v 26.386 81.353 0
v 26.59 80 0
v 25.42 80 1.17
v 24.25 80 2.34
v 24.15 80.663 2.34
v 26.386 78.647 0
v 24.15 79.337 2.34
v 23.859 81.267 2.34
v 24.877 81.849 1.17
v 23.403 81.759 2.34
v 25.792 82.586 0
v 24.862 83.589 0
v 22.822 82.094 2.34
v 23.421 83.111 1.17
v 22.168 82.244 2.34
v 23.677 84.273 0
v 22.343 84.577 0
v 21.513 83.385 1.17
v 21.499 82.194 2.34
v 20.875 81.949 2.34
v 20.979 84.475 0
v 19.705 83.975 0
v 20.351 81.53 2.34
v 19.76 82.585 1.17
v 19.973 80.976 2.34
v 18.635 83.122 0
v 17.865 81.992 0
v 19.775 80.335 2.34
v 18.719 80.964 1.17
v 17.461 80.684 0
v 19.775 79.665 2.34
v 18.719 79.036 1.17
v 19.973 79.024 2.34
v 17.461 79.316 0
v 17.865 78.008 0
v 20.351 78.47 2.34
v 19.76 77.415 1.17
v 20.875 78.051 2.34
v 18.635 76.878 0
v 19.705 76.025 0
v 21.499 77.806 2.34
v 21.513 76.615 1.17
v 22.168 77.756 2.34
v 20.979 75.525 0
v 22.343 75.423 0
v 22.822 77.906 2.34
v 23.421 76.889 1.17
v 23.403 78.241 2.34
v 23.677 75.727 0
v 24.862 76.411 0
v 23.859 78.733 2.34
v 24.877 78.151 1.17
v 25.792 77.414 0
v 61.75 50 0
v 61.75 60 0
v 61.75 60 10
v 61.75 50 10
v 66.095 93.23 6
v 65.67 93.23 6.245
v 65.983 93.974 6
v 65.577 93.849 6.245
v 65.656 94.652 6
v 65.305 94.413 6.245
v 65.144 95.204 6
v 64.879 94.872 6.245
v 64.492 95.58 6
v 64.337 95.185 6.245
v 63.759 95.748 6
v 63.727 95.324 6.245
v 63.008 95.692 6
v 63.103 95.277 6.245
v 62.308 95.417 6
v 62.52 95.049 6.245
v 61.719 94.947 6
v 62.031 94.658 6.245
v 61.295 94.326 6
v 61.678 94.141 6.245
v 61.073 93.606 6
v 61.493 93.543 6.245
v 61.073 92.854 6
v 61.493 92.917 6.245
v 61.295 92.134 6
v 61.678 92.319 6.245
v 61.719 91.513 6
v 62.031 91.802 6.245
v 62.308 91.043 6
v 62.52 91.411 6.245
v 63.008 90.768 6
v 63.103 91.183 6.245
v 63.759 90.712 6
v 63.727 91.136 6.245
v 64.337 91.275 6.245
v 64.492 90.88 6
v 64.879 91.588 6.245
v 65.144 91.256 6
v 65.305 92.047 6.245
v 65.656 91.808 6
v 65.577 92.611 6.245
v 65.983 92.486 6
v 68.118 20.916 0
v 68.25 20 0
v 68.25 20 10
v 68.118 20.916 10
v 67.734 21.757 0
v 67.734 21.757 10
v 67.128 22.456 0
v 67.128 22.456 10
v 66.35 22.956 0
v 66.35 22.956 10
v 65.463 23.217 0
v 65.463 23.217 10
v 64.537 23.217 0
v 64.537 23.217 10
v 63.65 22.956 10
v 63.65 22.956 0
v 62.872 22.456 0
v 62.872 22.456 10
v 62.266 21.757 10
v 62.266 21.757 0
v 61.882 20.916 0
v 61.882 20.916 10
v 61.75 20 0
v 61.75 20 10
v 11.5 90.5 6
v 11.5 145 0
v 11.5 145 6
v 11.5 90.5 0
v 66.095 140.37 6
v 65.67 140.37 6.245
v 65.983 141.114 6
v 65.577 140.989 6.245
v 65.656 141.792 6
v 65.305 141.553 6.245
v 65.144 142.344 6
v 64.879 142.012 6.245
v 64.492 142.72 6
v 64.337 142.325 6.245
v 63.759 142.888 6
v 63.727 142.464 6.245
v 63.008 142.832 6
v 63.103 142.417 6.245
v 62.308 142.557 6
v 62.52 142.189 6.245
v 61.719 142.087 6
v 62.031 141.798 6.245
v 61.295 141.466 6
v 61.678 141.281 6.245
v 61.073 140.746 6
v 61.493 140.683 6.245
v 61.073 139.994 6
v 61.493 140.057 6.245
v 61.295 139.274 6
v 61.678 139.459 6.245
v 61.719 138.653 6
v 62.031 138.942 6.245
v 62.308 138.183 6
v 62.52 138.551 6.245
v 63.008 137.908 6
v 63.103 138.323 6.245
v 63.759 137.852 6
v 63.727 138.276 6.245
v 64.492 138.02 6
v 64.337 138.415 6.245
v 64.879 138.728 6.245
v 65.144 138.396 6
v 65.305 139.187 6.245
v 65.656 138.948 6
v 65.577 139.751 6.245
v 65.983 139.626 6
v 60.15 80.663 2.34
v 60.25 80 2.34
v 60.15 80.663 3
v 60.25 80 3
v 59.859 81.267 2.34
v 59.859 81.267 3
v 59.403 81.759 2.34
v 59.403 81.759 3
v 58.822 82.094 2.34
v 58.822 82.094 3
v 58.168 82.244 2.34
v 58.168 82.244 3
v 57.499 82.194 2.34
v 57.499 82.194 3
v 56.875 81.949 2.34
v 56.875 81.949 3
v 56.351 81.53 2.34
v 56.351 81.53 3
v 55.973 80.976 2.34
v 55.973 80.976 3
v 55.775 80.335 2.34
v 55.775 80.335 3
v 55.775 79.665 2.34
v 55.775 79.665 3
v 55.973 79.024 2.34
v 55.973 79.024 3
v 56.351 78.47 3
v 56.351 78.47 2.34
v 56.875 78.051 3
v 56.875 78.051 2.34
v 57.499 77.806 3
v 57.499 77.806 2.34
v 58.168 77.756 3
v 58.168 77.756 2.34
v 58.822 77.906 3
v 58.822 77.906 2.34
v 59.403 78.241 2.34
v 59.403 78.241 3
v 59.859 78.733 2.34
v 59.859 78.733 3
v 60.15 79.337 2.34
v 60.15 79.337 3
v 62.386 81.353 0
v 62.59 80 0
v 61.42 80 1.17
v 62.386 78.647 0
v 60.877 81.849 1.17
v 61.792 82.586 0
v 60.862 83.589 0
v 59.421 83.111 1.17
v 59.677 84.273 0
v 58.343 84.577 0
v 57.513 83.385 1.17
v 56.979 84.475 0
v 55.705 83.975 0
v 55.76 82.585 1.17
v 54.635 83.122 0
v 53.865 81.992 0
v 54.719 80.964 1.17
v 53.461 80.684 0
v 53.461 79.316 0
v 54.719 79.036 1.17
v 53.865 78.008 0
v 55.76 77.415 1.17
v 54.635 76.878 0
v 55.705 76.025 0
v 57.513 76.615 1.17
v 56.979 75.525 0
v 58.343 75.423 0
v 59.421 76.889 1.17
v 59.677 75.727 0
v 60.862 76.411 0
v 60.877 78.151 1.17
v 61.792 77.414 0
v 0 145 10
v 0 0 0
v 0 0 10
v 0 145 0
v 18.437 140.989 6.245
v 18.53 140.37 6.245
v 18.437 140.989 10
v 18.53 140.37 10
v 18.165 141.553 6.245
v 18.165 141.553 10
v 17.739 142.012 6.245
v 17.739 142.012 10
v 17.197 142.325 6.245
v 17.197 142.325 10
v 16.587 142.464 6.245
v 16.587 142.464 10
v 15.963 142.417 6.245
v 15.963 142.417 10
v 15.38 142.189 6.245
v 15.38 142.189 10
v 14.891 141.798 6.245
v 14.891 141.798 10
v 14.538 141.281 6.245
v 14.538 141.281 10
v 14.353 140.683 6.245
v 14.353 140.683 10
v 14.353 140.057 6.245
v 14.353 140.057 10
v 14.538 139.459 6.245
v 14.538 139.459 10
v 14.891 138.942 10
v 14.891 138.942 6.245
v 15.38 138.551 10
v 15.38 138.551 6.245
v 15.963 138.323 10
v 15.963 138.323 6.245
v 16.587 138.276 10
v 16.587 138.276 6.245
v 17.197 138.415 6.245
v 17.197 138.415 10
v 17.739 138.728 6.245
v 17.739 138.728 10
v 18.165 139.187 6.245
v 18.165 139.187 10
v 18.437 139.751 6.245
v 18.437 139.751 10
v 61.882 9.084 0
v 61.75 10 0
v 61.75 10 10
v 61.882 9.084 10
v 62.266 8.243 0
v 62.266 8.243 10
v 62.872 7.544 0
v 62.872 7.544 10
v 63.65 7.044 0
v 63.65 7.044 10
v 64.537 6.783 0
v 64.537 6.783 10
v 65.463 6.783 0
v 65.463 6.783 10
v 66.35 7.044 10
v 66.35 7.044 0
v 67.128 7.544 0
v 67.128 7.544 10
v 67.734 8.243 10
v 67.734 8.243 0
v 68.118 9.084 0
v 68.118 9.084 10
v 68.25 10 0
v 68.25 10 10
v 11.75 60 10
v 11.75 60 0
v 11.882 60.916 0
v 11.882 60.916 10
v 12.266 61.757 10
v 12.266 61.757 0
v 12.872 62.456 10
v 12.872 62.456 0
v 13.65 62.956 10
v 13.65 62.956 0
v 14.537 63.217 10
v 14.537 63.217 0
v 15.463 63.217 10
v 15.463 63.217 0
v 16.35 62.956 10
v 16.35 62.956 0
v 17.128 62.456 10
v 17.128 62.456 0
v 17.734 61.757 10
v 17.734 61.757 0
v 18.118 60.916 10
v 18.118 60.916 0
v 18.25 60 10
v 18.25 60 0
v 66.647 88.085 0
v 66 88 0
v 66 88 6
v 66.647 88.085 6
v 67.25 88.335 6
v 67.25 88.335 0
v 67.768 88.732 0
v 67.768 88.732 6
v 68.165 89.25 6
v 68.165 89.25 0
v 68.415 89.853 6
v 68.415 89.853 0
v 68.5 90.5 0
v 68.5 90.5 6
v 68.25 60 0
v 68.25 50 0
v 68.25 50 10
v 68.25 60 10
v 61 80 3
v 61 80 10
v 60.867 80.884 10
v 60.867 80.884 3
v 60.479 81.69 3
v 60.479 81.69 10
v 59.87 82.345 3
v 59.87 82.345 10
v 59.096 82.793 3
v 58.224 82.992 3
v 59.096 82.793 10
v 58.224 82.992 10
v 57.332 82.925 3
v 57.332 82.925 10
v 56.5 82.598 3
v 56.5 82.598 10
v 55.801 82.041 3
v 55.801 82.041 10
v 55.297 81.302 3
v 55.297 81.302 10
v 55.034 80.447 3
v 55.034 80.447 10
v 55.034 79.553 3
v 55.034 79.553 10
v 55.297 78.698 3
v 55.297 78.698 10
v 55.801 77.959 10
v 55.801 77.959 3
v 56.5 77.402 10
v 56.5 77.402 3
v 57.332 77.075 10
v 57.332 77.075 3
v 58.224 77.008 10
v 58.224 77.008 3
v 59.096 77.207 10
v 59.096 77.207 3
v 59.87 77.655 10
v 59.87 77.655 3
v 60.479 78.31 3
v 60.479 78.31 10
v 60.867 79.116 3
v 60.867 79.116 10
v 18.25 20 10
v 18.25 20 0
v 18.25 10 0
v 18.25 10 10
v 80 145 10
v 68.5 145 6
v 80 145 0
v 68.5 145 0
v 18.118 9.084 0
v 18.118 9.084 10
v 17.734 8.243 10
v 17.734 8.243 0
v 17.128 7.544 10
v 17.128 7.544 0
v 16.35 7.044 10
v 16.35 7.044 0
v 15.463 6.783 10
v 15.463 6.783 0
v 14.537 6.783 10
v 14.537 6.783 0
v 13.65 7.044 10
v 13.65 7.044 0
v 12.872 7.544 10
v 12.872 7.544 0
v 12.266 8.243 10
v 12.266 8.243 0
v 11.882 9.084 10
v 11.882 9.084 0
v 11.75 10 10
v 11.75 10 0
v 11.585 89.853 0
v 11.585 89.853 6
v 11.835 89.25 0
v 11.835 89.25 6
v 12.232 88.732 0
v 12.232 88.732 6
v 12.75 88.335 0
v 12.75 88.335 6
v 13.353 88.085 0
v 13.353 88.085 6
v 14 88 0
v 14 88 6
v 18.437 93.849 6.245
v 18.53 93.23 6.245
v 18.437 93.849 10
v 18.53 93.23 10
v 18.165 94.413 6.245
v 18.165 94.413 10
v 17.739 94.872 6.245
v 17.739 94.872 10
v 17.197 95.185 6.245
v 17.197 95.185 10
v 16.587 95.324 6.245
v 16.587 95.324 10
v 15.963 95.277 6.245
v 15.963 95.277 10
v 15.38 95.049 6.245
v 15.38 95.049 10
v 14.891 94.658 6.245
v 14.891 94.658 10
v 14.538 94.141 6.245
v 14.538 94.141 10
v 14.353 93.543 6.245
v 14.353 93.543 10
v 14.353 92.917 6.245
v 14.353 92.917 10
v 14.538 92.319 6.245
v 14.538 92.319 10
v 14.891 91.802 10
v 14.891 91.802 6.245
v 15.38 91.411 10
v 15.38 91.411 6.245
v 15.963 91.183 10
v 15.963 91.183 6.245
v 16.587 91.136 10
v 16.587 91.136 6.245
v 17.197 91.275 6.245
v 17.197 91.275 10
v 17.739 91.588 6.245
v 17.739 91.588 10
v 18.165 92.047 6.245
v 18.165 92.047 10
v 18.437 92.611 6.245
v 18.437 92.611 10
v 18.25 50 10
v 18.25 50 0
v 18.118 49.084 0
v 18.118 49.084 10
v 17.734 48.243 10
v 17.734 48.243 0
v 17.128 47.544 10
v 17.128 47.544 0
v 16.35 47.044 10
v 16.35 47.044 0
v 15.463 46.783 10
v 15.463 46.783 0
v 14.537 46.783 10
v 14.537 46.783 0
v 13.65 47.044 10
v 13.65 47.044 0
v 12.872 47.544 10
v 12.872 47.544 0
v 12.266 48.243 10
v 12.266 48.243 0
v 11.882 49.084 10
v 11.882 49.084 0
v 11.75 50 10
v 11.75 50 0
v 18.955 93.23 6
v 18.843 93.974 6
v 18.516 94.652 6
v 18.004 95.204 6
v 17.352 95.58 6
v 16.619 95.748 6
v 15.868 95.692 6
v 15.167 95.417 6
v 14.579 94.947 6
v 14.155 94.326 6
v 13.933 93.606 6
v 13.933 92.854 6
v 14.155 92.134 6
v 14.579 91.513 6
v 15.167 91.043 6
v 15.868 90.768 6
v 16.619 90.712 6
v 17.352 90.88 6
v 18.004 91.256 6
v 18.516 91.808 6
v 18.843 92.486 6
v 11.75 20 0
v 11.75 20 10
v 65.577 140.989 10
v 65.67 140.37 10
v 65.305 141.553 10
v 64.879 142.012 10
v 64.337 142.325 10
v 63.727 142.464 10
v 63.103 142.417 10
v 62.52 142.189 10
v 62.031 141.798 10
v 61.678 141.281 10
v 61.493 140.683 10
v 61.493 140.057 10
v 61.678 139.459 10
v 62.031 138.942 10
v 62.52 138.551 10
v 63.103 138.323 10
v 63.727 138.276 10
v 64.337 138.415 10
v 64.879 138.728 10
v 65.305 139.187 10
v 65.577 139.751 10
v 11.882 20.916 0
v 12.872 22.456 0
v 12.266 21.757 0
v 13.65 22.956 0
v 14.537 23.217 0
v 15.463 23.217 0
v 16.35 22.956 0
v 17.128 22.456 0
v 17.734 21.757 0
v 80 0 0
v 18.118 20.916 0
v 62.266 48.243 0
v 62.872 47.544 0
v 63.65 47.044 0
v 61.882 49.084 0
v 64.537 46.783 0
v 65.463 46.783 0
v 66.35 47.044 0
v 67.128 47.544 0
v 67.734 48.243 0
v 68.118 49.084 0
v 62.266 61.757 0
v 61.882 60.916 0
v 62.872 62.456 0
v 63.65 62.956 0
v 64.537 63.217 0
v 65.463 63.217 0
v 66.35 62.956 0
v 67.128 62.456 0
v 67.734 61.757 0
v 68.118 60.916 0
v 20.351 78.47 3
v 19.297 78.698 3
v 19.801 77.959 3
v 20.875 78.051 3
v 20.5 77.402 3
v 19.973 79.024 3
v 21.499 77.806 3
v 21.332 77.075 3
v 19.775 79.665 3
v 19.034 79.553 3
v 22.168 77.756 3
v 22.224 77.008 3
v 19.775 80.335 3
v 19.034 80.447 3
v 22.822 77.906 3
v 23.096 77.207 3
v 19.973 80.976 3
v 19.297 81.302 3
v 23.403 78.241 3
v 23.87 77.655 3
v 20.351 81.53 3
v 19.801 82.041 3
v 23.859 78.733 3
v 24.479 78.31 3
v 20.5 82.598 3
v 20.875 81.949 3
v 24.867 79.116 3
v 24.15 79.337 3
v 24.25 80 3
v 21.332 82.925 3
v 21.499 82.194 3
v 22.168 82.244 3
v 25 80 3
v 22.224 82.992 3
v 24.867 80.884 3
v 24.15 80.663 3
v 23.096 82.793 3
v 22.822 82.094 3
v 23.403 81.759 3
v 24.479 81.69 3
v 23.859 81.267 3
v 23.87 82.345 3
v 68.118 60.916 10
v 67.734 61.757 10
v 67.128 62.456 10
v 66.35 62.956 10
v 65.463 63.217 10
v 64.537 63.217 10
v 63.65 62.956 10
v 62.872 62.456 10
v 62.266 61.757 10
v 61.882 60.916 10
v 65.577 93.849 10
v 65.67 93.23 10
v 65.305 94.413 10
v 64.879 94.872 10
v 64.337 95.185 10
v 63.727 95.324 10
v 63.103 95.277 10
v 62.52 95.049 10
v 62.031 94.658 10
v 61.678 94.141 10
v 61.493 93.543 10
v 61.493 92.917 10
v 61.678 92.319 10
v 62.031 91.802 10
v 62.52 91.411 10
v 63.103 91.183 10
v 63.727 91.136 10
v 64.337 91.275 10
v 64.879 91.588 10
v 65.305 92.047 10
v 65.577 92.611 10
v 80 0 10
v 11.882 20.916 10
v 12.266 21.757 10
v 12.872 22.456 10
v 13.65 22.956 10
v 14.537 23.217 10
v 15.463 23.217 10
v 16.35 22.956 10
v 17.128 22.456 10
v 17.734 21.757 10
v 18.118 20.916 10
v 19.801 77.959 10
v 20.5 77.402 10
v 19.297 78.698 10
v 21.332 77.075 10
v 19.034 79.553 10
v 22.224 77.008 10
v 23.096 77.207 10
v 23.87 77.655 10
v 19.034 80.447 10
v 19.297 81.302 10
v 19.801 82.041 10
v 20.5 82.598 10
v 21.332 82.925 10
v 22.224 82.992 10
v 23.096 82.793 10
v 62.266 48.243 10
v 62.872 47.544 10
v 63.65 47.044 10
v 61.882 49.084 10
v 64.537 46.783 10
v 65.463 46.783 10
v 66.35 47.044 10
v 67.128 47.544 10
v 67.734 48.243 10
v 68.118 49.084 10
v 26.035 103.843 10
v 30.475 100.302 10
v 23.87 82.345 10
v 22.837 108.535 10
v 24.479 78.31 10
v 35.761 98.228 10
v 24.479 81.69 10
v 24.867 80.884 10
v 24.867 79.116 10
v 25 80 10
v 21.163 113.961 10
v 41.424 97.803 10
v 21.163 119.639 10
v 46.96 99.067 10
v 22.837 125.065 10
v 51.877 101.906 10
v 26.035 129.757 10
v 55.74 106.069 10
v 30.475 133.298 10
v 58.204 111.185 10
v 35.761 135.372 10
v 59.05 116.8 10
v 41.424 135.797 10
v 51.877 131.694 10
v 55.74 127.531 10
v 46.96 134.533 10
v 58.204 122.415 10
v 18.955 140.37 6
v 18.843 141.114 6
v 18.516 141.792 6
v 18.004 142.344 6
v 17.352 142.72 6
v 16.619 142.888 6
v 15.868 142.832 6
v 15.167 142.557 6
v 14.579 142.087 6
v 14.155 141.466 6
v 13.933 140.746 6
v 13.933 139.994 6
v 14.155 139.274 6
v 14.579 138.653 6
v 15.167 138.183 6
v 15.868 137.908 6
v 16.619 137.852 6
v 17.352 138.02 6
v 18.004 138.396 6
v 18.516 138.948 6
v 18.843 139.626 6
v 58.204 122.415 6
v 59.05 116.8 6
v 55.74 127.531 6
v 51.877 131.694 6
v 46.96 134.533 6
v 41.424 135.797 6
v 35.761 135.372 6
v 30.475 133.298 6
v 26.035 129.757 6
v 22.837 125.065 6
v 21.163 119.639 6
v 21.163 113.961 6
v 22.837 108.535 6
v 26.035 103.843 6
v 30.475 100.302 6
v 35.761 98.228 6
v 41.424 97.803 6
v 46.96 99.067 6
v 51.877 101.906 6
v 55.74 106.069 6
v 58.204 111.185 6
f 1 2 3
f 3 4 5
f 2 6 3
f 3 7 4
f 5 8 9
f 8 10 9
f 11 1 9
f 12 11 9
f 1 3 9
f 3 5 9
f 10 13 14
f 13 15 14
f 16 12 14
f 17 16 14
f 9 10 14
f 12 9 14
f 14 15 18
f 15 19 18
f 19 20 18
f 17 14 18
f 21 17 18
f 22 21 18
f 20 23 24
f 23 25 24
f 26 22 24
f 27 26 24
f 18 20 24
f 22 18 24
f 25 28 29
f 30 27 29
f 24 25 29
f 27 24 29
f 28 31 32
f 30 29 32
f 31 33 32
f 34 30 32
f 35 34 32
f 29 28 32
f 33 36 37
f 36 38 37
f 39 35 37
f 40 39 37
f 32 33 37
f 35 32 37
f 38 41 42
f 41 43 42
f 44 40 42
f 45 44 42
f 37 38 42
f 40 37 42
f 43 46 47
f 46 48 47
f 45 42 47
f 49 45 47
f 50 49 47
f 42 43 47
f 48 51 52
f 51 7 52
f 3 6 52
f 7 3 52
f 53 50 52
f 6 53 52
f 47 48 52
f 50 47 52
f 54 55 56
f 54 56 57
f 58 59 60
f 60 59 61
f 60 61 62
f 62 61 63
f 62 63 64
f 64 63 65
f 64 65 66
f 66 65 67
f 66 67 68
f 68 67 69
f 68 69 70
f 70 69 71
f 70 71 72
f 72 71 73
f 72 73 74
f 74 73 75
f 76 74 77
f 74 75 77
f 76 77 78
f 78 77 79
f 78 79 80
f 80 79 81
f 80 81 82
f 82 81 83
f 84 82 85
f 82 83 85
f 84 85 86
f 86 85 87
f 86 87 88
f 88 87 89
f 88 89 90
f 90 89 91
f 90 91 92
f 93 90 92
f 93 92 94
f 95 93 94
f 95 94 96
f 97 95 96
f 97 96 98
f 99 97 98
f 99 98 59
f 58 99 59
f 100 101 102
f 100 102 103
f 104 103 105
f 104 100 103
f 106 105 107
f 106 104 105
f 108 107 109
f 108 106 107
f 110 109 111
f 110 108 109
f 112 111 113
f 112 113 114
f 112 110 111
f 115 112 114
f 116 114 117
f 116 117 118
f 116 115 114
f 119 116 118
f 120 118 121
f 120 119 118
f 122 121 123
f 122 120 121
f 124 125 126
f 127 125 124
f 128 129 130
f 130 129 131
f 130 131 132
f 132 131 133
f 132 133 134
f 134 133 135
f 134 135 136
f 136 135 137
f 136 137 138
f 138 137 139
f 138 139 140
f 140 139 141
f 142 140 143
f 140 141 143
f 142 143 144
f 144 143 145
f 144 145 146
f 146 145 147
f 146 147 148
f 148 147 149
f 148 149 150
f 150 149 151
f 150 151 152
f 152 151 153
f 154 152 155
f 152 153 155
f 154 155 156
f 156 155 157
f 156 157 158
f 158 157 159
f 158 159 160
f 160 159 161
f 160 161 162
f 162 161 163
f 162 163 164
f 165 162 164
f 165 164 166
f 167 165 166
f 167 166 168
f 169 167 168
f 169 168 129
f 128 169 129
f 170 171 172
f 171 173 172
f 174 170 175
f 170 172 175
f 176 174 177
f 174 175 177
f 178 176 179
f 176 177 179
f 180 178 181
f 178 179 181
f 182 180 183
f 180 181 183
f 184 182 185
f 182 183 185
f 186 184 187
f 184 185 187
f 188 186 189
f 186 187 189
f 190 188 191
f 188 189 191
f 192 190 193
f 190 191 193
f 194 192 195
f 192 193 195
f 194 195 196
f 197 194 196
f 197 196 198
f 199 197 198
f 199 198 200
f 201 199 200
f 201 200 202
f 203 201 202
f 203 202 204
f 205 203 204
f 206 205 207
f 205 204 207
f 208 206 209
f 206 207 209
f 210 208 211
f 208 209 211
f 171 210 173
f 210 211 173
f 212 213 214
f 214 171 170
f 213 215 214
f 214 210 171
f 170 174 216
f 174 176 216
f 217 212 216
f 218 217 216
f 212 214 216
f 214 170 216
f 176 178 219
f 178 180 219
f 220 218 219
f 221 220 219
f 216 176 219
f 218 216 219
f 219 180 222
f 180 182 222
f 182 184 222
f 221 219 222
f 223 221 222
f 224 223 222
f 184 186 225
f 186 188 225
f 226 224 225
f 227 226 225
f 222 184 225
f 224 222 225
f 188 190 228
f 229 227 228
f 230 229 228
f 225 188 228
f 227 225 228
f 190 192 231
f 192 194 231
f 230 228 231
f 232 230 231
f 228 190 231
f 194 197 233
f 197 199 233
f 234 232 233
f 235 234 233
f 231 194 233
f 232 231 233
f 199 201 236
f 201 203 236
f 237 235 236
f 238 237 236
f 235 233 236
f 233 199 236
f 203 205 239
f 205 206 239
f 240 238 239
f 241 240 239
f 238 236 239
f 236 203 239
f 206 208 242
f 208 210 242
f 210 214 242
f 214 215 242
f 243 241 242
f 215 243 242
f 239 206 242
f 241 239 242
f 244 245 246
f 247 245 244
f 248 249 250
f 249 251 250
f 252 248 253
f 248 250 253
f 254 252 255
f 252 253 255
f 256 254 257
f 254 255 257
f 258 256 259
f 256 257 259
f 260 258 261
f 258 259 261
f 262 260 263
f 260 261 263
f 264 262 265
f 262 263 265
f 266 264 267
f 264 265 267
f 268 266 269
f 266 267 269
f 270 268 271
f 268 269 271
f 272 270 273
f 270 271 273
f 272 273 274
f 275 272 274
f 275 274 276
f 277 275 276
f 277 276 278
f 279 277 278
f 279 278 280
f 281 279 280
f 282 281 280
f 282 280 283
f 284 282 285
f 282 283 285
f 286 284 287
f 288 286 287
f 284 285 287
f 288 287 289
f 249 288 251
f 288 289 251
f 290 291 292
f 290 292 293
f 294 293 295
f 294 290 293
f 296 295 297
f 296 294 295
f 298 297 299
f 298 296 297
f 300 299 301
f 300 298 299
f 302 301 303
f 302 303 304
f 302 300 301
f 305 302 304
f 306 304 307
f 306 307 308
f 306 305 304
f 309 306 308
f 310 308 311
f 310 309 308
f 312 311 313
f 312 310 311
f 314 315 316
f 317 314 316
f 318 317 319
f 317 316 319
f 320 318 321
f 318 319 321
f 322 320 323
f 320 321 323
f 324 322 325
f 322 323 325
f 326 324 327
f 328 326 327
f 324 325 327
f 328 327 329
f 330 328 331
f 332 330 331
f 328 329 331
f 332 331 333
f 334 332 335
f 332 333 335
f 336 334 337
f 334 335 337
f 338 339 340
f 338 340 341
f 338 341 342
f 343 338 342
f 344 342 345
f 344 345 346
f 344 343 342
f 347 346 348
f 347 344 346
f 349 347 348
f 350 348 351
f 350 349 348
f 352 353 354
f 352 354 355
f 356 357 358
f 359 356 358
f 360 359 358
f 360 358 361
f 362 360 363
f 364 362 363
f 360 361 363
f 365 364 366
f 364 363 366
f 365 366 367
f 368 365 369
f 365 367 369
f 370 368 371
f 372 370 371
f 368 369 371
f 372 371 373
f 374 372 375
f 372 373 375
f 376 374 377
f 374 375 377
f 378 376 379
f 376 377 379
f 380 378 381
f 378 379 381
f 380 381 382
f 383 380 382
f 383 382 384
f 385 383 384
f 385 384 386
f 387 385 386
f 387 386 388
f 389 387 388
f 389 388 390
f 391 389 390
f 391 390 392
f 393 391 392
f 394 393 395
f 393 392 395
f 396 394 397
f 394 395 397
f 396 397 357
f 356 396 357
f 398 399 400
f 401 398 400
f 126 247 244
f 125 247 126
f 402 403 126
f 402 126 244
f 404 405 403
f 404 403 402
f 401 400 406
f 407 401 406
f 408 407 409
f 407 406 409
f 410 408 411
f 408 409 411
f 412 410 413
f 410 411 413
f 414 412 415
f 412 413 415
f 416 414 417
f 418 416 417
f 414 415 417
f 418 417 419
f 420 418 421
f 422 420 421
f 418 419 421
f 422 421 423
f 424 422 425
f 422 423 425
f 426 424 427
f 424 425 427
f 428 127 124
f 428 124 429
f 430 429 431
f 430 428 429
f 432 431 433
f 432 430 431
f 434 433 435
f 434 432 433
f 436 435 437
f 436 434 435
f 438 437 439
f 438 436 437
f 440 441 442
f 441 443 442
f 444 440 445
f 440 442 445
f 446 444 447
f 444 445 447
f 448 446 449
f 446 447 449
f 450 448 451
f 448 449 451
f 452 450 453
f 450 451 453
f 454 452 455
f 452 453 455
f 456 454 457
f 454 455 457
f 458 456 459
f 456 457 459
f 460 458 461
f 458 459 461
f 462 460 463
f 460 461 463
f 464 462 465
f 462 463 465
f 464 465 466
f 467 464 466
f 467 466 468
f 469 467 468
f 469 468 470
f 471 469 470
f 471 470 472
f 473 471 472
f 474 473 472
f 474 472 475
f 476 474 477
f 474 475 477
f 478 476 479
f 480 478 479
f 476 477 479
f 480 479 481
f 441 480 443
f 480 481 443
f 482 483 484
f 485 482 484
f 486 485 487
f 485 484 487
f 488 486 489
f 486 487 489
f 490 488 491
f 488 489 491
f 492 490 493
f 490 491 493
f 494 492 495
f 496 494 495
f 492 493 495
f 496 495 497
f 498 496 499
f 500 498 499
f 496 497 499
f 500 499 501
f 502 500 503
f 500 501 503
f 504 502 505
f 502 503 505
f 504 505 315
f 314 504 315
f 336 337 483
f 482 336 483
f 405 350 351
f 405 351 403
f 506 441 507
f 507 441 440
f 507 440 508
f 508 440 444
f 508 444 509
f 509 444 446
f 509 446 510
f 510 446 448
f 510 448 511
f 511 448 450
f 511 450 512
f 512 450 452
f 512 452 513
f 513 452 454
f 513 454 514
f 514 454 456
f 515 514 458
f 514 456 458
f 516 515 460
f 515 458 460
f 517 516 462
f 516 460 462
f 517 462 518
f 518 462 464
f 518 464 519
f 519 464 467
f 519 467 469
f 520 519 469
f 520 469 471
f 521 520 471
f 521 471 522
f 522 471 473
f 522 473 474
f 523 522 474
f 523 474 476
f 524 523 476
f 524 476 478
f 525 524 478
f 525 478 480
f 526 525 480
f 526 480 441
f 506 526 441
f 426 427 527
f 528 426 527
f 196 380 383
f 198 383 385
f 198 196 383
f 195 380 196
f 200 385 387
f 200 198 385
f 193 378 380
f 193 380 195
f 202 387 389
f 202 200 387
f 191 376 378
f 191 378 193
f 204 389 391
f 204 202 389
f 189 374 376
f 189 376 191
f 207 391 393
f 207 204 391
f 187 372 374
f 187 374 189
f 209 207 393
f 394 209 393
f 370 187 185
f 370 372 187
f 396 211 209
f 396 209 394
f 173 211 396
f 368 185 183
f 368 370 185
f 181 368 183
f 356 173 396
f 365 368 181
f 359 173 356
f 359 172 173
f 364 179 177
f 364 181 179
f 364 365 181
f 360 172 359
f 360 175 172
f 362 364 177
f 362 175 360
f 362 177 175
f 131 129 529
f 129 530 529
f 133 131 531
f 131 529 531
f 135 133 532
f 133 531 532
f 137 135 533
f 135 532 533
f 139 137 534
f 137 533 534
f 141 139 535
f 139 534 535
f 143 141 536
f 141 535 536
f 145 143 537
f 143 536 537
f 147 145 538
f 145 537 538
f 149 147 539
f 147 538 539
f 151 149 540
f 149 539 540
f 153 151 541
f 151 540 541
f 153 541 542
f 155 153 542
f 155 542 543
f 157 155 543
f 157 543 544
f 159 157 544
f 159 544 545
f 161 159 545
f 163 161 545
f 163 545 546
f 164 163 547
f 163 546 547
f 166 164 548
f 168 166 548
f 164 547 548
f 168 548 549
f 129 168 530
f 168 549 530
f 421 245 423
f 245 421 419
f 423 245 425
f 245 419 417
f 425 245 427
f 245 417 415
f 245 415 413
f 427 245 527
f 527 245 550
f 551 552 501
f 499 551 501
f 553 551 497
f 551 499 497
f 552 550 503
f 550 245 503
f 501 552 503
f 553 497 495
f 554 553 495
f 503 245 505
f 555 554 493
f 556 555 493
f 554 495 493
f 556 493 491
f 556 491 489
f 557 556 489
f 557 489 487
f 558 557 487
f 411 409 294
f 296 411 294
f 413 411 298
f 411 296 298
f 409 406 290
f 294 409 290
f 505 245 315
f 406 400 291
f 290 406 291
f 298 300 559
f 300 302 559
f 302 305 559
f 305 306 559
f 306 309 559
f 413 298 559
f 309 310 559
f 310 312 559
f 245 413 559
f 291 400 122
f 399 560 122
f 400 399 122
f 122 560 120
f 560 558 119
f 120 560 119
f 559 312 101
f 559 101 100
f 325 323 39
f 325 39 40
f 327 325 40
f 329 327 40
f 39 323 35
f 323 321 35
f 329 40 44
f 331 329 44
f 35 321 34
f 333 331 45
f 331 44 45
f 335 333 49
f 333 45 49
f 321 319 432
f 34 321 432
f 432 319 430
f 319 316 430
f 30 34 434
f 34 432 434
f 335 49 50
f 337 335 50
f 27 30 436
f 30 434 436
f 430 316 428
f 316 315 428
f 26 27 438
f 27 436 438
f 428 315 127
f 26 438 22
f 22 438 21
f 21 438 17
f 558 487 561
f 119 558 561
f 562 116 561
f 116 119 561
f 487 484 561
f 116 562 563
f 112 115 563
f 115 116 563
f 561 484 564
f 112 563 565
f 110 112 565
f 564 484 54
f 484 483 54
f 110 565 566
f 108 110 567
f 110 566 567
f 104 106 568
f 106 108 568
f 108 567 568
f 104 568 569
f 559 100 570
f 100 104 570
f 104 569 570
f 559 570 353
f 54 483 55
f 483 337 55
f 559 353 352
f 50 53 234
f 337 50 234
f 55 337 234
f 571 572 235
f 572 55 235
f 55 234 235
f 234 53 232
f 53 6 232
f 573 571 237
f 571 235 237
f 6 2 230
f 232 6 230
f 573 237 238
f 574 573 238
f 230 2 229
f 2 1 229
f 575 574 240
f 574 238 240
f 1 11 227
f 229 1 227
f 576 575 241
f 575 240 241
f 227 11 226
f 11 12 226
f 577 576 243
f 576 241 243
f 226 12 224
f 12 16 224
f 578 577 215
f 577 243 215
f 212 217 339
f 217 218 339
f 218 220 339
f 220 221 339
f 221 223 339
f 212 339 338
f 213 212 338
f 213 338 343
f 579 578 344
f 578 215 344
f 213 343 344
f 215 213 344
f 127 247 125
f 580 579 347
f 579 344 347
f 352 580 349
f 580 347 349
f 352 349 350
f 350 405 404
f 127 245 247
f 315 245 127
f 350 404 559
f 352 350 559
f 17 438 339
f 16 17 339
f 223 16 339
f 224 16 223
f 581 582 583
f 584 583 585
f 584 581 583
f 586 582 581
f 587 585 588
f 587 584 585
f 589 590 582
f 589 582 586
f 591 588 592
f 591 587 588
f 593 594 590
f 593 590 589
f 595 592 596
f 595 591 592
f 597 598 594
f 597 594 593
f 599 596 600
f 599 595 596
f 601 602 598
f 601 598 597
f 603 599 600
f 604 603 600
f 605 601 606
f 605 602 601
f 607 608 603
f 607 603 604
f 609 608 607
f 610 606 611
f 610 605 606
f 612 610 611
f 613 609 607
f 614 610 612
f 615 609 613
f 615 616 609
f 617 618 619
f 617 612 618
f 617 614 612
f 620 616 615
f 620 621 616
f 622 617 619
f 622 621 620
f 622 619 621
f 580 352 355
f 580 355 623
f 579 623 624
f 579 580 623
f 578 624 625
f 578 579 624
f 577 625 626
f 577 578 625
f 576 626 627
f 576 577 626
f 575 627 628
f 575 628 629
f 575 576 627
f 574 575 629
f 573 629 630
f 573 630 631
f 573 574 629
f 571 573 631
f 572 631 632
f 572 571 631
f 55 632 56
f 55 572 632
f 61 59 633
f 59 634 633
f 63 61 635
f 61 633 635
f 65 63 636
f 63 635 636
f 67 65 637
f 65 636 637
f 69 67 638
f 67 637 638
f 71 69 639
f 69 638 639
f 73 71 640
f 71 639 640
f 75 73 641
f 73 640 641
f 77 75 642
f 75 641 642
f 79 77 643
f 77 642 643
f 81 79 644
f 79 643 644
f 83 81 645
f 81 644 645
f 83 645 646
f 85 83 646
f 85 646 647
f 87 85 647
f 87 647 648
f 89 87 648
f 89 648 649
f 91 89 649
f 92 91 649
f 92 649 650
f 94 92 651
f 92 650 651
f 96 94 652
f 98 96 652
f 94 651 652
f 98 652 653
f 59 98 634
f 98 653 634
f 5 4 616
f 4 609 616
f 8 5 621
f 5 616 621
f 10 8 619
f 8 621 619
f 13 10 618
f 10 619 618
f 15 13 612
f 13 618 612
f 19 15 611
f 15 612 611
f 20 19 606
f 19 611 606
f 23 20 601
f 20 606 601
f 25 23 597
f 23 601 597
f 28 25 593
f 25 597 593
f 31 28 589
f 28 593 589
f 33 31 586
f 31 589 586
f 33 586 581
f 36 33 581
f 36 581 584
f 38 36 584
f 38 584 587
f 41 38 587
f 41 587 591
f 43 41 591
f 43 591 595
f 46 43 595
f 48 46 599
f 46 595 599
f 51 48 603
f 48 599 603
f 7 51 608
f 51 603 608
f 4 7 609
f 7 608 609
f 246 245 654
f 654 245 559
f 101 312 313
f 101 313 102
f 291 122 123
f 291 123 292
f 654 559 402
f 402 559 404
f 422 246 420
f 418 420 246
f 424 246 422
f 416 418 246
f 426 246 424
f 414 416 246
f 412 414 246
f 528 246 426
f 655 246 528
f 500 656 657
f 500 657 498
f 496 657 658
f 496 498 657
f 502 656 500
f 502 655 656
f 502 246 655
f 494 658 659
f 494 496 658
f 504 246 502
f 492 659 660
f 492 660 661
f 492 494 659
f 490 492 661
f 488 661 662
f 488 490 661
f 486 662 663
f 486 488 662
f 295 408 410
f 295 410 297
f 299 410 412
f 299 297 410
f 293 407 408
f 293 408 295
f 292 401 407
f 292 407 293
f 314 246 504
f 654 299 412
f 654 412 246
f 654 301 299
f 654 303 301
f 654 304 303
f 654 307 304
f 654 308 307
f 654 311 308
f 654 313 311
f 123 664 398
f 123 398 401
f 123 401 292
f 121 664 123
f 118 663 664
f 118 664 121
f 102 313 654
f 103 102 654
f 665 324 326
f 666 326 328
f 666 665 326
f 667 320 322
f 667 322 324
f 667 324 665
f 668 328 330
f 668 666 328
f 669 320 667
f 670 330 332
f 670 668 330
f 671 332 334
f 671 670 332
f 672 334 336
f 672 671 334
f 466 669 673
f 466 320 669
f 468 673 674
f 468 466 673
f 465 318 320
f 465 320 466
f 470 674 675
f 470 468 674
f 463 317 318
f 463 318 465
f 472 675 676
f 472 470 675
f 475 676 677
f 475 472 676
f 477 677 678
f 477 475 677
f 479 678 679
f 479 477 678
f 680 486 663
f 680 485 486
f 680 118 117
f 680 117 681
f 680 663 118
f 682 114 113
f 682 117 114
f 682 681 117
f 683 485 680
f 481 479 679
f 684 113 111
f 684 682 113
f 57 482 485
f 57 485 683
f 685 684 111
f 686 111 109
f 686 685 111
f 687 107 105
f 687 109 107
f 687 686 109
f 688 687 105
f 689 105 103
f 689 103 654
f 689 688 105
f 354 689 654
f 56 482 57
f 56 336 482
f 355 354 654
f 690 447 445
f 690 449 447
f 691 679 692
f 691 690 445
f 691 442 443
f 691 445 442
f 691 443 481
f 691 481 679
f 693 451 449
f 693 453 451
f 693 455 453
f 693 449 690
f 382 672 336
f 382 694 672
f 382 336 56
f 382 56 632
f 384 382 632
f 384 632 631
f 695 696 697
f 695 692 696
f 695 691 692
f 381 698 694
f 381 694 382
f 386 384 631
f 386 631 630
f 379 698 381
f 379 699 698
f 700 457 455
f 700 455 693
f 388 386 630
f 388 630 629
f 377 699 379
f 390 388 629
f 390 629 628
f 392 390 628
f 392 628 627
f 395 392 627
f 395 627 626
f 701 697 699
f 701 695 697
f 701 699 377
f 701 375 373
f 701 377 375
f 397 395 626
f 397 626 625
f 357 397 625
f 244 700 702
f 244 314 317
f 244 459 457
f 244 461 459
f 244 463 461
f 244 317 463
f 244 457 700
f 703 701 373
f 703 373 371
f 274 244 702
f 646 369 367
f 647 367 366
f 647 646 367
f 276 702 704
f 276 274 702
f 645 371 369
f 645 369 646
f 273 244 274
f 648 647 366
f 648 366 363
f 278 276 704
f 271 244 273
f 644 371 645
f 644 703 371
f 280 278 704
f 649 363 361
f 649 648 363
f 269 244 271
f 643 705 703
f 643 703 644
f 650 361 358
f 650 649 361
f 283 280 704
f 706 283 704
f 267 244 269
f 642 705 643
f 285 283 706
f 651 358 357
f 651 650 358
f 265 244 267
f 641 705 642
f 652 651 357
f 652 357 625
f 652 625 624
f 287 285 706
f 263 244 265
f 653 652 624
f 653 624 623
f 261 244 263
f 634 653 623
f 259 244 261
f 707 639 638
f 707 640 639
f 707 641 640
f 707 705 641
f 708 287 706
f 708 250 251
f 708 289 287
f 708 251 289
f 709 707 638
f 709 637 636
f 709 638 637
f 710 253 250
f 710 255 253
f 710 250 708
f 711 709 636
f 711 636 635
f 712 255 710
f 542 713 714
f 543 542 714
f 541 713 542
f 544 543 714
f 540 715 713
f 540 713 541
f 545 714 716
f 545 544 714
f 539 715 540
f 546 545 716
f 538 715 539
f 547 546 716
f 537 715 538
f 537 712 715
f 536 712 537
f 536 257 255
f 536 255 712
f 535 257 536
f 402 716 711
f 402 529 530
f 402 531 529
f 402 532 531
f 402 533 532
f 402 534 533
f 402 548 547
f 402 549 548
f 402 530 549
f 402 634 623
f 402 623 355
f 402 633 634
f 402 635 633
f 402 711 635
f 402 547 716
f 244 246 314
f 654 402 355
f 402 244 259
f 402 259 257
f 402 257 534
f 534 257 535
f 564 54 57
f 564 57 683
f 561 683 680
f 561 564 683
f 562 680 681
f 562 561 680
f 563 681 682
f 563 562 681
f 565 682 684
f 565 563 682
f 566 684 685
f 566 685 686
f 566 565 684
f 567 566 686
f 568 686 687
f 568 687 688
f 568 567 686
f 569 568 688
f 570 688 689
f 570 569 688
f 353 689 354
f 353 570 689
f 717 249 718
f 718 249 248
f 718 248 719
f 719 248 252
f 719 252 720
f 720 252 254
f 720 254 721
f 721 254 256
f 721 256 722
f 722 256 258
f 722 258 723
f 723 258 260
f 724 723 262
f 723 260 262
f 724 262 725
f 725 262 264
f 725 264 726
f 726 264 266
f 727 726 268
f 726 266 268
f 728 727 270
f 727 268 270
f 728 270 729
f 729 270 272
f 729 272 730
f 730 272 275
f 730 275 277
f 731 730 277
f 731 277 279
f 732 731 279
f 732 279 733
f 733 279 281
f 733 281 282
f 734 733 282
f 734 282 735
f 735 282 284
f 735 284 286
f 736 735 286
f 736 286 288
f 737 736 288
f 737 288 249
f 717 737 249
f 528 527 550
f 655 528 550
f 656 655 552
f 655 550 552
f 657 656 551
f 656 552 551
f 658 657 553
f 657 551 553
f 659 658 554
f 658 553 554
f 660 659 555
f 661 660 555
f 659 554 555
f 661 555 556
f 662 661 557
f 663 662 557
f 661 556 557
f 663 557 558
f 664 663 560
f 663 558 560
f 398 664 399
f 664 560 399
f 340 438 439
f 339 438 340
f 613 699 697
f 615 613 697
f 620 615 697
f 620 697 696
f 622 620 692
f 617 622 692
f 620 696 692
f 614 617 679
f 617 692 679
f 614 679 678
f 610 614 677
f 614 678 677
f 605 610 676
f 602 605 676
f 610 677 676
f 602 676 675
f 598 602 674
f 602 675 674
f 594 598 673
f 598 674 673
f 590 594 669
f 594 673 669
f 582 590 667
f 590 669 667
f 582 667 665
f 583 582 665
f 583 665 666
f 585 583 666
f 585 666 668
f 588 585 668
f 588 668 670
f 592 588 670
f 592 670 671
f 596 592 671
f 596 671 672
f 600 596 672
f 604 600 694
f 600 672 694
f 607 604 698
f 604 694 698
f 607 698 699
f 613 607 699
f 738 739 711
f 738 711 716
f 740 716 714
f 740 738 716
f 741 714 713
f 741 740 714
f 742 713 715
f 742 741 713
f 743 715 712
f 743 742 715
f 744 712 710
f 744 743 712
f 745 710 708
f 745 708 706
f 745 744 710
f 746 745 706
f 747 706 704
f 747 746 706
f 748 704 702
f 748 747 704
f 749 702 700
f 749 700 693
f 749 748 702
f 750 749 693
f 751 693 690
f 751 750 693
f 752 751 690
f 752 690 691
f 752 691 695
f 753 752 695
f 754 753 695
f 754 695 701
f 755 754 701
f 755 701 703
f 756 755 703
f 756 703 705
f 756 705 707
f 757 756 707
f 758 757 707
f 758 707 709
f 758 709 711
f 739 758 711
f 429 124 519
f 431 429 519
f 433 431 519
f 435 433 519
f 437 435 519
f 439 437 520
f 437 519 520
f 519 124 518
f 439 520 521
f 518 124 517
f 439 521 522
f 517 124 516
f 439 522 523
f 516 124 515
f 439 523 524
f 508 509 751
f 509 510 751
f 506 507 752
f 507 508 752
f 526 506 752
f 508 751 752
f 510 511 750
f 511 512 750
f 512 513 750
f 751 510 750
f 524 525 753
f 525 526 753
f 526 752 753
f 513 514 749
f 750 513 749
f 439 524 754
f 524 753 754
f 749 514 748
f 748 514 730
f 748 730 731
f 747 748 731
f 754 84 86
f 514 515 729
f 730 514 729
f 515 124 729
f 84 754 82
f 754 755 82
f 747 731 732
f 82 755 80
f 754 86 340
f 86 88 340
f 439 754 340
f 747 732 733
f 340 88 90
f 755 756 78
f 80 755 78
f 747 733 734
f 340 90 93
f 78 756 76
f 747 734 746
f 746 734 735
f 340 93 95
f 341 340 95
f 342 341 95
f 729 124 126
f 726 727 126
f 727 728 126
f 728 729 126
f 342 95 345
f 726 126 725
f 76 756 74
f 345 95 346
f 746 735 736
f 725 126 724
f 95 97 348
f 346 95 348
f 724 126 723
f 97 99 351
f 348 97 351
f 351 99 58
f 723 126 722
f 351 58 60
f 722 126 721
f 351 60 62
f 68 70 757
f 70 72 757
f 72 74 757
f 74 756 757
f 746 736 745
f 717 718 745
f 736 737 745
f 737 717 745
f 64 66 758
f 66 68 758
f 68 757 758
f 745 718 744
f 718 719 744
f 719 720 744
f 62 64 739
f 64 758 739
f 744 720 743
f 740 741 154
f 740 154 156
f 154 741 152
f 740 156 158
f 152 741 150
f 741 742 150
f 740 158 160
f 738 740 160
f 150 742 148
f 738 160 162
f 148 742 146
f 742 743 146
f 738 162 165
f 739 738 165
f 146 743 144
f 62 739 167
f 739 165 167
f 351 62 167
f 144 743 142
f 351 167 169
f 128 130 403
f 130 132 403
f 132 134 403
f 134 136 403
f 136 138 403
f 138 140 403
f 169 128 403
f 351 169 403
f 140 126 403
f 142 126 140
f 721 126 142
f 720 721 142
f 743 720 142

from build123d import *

# Parameters (mm, degrees)
SKETCH_1_W                  = 80
SKETCH_1_H                  = 145
SKETCH_1_R                  = 19.05
EXTRUDE_1_DEPTH             = 10
CUT_EXTRUDE_1_DEPTH         = 6
HOLE_WIZARD_M51_D           = 4.2
HOLE_WIZARD_M51_DEPTH       = 14
HOLE_WIZARD_M51_CSINK_D     = 5.05
HOLE_WIZARD_M51_CSINK_ANGLE = 120
HOLE_WIZARD_M51_TIP         = 1.2618073
SKETCH_5_R                  = 3
CUT_EXTRUDE_2_DEPTH         = 7
HOLE_WIZARD_M41_D           = 4.5
HOLE_WIZARD_M41_CSINK_D     = 9.18
HOLE_WIZARD_M41_CSINK_ANGLE = 90


with BuildPart() as part:
    # Эскиз1 → Бобышка-Вытянуть1 (new body)
    with BuildSketch(Plane.XY):
        with Locations((40, 72.5)):
            Rectangle(SKETCH_1_W, SKETCH_1_H)
        with Locations((40, 116.8)):
            Circle(SKETCH_1_R, mode=Mode.SUBTRACT)
        with BuildLine():
            Line((18.25, 60), (18.25, 50))
            ThreePointArc((18.25, 50), (15, 46.75), (11.75, 50))
            Line((11.75, 50), (11.75, 60))
            ThreePointArc((11.75, 60), (15, 63.25), (18.25, 60))
        make_face(mode=Mode.SUBTRACT)
        with BuildLine():
            Line((18.25, 20), (18.25, 10))
            ThreePointArc((18.25, 10), (15, 6.75), (11.75, 10))
            Line((11.75, 10), (11.75, 20))
            ThreePointArc((11.75, 20), (15, 23.25), (18.25, 20))
        make_face(mode=Mode.SUBTRACT)
        with BuildLine():
            Line((61.75, 20), (61.75, 10))
            ThreePointArc((61.75, 10), (65, 6.75), (68.25, 10))
            Line((68.25, 10), (68.25, 20))
            ThreePointArc((68.25, 20), (65, 23.25), (61.75, 20))
        make_face(mode=Mode.SUBTRACT)
        with BuildLine():
            Line((61.75, 60), (61.75, 50))
            ThreePointArc((61.75, 50), (65, 46.75), (68.25, 50))
            Line((68.25, 50), (68.25, 60))
            ThreePointArc((68.25, 60), (65, 63.25), (61.75, 60))
        make_face(mode=Mode.SUBTRACT)
    extrude(amount=EXTRUDE_1_DEPTH)

    # Эскиз4 → Вырез-Вытянуть1 (cut)
    with BuildSketch(Plane(origin=(0, 0, 0), x_dir=(-1, 0, 0), z_dir=(0, 0, -1))):
        with BuildLine():
            Line((-68.5, 145), (-11.5, 145))
            Line((-11.5, 145), (-11.5, 90.5))
            ThreePointArc((-11.5, 90.5), (-12.232233047, 88.732233047), (-14, 88))
            Line((-14, 88), (-66, 88))
            ThreePointArc((-66, 88), (-67.767766953, 88.732233047), (-68.5, 90.5))
            Line((-68.5, 90.5), (-68.5, 145))
        make_face()
    extrude(amount=-CUT_EXTRUDE_1_DEPTH, mode=Mode.SUBTRACT)

    # Отверстие обработанное метчиком M51
    with Locations(Plane(origin=(24.344692429, -10.713064845, 6), x_dir=(-1, 0, 0), z_dir=(0, 0, -1))):
        with Locations((7.914692429, 103.943064845), (7.914692429, 151.083064845), (-39.225307571, 151.083064845), (-39.225307571, 103.943064845)):
            CounterSinkHole(HOLE_WIZARD_M51_D / 2, HOLE_WIZARD_M51_CSINK_D / 2, depth=HOLE_WIZARD_M51_DEPTH, counter_sink_angle=HOLE_WIZARD_M51_CSINK_ANGLE)
            with Locations((0, 0, -(HOLE_WIZARD_M51_DEPTH + HOLE_WIZARD_M51_TIP / 2))):  # 118° drill point
                Cone(0, HOLE_WIZARD_M51_D / 2, HOLE_WIZARD_M51_TIP, mode=Mode.SUBTRACT)

    # Эскиз5 → Вырез-Вытянуть2 (cut)
    with BuildSketch(Plane.XY.offset(10)):
        with Locations((22, 80)):
            Circle(SKETCH_5_R)
        with Locations((58, 80)):
            Circle(SKETCH_5_R)
    extrude(amount=-CUT_EXTRUDE_2_DEPTH, mode=Mode.SUBTRACT)

    # Зенковка для винта с потайной головкой и внутренним шестигранником M41 (through all)
    with Locations(Plane(origin=(0, 0, 0), x_dir=(-1, 0, 0), z_dir=(0, 0, -1))):
        with Locations((-22, 80), (-58, 80)):
            CounterSinkHole(HOLE_WIZARD_M41_D / 2, HOLE_WIZARD_M41_CSINK_D / 2, counter_sink_angle=HOLE_WIZARD_M41_CSINK_ANGLE)


solid = part.part
